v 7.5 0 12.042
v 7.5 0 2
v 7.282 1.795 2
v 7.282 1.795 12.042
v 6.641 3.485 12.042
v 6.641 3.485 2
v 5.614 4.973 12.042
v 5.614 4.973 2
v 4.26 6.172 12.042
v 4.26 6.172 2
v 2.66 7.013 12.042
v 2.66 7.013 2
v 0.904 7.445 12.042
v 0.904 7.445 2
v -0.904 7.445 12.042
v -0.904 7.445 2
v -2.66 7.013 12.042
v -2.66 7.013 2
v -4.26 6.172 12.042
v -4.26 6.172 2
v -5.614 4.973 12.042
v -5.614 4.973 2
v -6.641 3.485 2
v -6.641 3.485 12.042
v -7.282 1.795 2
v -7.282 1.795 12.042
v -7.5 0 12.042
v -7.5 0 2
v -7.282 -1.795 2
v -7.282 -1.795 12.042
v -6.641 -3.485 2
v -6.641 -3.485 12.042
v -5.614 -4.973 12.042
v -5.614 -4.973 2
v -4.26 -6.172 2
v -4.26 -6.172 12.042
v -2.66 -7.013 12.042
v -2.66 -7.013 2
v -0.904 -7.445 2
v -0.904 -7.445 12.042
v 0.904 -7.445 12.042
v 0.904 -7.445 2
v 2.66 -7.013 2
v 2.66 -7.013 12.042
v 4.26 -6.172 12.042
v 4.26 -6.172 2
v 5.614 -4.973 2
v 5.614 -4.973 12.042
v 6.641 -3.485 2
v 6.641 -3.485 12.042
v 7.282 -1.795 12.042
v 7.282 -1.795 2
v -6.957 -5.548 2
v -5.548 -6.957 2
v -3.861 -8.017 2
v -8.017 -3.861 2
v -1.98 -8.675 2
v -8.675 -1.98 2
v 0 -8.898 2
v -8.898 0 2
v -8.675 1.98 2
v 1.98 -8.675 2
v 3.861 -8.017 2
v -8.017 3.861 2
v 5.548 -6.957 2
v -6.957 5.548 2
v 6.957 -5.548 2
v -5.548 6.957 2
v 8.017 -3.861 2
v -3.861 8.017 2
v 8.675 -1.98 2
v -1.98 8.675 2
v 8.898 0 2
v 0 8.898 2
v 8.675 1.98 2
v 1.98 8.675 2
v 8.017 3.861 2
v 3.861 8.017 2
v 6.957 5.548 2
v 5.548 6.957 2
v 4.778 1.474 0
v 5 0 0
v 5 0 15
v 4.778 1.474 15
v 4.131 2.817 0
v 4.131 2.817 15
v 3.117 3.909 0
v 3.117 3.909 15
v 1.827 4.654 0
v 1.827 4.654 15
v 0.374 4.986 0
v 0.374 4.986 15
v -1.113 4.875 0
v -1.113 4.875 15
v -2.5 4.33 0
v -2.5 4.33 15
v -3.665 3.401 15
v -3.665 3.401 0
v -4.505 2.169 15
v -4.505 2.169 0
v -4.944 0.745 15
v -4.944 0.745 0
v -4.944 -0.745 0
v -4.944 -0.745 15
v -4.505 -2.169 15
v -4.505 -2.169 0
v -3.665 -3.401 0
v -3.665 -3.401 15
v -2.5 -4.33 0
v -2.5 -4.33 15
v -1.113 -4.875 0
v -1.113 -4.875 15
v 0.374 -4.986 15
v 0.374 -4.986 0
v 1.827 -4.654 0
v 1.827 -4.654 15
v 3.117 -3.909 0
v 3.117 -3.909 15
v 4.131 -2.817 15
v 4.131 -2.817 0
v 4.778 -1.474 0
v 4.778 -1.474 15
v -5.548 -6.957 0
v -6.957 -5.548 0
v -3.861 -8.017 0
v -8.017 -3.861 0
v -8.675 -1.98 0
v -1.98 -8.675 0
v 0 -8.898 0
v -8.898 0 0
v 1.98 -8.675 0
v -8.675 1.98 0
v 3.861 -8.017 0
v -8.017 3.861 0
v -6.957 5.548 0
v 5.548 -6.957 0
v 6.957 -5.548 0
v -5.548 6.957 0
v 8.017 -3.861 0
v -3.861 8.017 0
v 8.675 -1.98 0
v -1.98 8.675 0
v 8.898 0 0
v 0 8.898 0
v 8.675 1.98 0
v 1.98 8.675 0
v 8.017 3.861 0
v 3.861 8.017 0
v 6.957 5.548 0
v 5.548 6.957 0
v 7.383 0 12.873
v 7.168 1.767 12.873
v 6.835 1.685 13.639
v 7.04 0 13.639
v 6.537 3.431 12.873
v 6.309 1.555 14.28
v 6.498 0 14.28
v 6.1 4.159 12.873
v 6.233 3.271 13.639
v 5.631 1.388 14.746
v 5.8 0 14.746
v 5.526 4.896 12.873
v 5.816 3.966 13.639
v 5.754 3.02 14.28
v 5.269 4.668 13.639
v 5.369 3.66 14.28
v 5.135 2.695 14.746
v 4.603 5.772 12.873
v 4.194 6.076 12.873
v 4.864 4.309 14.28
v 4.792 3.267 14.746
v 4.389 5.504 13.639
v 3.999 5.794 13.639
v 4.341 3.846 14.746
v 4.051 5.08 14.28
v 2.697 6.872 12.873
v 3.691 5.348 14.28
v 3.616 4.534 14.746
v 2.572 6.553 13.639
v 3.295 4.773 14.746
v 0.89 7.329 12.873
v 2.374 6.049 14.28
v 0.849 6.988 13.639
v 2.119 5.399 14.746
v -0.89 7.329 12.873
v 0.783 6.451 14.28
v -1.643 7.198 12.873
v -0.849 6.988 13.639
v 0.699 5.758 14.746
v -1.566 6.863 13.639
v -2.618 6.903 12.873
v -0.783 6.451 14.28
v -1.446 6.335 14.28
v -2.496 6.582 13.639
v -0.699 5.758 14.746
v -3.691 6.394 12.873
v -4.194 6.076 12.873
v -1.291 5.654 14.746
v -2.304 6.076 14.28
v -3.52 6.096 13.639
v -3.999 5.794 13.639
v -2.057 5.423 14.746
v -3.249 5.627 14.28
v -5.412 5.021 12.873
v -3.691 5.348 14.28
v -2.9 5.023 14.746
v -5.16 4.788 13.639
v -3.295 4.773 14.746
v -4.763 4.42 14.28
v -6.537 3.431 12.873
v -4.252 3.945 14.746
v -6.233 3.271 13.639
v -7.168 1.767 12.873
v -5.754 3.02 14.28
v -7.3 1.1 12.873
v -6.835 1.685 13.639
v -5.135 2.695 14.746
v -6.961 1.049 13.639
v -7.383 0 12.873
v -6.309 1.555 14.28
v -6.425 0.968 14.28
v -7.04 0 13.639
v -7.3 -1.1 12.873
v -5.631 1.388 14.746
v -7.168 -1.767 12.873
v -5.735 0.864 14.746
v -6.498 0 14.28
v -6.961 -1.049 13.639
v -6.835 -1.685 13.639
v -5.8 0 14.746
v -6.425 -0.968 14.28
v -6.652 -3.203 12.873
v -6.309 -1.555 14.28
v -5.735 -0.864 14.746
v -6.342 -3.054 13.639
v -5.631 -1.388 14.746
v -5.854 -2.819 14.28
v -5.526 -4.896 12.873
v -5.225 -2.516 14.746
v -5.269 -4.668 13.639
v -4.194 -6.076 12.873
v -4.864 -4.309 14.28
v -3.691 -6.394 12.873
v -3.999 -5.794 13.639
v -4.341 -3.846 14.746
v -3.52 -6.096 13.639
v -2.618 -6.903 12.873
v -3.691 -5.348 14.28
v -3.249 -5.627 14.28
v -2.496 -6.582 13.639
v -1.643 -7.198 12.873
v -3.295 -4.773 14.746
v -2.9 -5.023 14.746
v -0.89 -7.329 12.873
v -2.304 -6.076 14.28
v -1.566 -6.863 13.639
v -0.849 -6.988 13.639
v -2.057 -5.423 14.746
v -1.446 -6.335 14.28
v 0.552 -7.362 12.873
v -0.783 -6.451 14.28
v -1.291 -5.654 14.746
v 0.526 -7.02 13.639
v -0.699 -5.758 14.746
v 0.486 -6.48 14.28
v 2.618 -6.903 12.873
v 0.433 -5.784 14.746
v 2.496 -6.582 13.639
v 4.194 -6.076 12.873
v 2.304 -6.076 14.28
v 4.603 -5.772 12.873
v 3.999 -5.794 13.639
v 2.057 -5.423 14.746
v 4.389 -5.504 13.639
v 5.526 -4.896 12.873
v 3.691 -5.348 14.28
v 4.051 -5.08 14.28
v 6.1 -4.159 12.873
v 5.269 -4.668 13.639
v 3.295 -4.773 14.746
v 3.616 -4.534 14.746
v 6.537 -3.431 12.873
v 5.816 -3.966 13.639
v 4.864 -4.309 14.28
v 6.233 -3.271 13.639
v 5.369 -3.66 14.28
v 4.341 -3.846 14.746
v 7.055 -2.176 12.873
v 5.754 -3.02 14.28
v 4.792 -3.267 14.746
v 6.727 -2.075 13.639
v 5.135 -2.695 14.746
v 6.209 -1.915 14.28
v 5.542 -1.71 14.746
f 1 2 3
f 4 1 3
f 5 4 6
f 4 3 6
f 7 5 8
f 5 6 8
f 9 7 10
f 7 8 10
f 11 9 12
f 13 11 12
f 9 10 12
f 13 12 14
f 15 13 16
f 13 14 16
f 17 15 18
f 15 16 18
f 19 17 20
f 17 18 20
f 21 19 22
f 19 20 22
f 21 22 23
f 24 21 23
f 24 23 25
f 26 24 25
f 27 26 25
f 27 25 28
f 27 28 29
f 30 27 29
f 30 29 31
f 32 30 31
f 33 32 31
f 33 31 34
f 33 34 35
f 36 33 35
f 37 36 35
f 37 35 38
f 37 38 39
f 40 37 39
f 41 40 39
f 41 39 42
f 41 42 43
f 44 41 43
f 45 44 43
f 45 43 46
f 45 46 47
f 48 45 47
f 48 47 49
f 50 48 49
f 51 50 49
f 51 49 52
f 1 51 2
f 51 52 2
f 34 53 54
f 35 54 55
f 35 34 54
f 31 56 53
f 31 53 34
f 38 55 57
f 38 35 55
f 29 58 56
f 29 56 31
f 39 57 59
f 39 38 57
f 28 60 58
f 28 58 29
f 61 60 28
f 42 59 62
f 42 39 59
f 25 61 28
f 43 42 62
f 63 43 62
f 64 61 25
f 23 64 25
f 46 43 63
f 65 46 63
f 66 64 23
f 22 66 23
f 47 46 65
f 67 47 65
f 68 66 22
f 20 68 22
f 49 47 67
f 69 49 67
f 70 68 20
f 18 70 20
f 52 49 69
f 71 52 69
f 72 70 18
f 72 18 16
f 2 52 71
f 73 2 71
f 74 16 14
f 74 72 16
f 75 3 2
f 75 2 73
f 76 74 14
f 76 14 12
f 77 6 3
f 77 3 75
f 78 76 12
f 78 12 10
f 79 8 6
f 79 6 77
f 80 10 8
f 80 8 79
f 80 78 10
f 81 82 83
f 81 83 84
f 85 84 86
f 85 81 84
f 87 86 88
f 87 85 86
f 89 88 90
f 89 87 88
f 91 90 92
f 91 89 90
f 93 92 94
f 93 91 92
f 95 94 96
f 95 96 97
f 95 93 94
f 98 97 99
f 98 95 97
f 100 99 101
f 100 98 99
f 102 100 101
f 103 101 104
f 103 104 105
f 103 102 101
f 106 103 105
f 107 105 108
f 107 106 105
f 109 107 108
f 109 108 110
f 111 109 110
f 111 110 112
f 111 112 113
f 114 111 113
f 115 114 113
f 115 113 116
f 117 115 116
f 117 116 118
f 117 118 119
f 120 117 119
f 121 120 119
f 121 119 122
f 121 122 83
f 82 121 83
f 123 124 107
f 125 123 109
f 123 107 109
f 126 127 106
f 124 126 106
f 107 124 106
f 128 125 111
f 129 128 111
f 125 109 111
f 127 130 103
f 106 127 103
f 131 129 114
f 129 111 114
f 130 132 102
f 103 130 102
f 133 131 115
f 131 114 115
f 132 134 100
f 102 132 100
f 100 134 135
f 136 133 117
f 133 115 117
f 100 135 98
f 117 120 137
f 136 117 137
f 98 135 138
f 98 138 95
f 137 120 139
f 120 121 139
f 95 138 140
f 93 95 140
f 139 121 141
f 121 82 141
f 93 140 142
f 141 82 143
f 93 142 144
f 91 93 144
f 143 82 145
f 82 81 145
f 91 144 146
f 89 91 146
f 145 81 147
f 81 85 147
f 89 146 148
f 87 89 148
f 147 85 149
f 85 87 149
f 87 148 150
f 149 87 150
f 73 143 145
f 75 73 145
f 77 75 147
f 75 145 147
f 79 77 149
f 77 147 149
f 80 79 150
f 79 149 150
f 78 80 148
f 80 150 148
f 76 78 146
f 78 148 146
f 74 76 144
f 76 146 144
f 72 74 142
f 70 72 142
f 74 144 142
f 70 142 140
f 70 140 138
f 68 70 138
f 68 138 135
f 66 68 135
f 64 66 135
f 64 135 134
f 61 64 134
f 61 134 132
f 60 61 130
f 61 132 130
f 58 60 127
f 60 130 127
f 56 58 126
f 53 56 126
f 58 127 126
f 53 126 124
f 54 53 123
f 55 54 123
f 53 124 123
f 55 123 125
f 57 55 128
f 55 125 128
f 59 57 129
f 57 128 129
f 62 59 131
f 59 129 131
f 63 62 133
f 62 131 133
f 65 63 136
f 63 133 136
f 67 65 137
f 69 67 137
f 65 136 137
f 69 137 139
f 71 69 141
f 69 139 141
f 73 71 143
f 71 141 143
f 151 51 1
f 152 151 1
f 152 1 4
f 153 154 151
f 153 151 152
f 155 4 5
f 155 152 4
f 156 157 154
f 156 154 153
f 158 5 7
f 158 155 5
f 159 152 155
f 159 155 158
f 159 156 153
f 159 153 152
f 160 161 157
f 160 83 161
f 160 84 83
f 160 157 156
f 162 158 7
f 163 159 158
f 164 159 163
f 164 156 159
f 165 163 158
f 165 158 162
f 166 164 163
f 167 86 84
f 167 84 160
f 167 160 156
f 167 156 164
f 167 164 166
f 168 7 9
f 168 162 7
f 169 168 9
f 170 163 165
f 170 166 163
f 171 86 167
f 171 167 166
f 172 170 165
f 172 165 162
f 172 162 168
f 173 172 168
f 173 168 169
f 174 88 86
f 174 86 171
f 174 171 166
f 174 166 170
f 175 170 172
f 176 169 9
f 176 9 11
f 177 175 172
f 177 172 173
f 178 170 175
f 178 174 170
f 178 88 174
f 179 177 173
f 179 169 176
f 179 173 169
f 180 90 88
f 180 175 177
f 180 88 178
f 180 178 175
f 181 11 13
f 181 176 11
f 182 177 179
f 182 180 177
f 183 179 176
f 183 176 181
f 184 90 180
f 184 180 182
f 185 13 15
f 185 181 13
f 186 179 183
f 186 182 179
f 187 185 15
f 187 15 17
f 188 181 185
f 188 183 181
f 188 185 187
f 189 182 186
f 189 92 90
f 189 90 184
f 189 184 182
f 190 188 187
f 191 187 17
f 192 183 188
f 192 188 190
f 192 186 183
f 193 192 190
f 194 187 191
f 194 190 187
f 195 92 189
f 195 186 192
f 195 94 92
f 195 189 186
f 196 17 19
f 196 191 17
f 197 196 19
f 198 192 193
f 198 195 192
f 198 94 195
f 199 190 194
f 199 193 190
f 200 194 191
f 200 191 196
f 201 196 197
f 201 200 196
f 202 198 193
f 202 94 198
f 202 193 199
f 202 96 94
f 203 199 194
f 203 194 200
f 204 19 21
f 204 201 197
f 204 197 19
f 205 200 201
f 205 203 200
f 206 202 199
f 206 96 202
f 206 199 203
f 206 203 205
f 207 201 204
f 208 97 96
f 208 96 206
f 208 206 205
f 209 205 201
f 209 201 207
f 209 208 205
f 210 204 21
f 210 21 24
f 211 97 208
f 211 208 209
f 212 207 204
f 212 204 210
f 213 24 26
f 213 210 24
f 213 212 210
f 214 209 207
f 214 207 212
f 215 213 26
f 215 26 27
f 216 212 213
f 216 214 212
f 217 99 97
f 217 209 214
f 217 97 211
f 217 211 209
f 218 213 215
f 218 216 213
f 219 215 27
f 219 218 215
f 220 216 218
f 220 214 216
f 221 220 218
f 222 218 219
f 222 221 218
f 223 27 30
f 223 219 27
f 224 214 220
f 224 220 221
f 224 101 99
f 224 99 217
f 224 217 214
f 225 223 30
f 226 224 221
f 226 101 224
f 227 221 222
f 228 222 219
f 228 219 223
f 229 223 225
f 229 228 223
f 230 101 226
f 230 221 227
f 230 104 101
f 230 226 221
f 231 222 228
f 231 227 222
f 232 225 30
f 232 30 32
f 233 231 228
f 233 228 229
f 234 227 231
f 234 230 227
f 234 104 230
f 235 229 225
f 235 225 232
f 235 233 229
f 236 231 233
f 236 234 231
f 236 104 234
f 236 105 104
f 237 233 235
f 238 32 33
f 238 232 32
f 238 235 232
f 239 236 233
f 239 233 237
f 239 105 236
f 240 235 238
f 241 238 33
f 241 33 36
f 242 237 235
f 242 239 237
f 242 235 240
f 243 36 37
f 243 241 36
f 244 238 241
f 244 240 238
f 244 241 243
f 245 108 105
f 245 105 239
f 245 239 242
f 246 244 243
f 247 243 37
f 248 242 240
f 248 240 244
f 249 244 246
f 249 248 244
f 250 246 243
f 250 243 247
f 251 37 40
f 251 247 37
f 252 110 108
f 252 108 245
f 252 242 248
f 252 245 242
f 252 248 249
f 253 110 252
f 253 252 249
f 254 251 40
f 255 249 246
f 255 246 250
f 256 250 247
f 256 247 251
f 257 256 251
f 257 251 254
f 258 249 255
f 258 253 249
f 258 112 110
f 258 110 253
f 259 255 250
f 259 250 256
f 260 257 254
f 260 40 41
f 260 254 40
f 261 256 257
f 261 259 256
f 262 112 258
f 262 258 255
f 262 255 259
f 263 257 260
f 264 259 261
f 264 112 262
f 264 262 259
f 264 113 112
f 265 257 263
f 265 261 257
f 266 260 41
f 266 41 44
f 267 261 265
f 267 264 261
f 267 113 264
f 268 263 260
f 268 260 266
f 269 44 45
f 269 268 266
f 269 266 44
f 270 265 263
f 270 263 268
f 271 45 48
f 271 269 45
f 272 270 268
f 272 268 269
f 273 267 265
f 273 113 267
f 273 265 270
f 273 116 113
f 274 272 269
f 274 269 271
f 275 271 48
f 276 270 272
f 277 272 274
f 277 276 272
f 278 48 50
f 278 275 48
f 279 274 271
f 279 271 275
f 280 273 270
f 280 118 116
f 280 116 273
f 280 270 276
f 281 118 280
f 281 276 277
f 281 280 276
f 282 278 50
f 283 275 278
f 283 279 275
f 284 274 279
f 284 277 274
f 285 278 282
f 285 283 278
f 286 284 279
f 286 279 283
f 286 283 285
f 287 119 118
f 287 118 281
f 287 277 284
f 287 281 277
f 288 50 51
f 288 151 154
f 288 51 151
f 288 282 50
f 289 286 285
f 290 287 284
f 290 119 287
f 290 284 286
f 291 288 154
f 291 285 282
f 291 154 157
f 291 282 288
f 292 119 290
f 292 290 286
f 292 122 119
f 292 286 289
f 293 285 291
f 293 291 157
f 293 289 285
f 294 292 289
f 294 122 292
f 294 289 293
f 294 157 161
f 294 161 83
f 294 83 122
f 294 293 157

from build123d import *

# Parameters (mm, degrees)
F0_R     = 7.5
F1_DEPTH = 15
F2_R     = 8.8984666771
F2_R_2   = 7.5
F3_DEPTH = 2
F4_T     = 2.5


# Not quite as in the source:
# - a fillet or chamfer that OpenCascade refuses, or shapes differently, is made with other operations: its cross-section is extruded or revolved along the edge and cut away or added
# - a shell that OpenCascade refuses in one call is made with other operations: the cavity is built on its own and cut out


with BuildPart() as f1:
    # F0 (on Top) → F1 (new body)
    with BuildSketch(Plane.XY):
        Circle(F0_R)
    extrude(amount=F1_DEPTH)

    # F2 (on face) → F3 (join)
    with BuildSketch(Plane.XY):
        Circle(F2_R)
        Circle(F2_R_2, mode=Mode.SUBTRACT)
    extrude(amount=F3_DEPTH)

    # F4: shell of thickness 2.5, made by hand


with BuildPart() as f4_core1:
    # F4_t2: copy of F1
    add(f1.part)

    # the walls: a layer under each face that stays
    f4_faces = [f4_core1.faces().sort_by_distance(p)[0] for p in [
        (-7.5, 0, 8.5),
        (-5.9323111181, -5.9323111181, 2),
        (-8.8984666771, 0, 1),
    ]]
    thicken(f4_faces, amount=-F4_T, mode=Mode.SUBTRACT)

    # F4_s3 → F4_t4 (revolve, cut)
    with BuildSketch(Plane.XZ):
        Polygon((7.525, 2.025), (5, 2), (5, -0.5), (7.5, -0.5), align=None)
    revolve(axis=Axis((0, 0, 2), (0, 0, 1)), mode=Mode.SUBTRACT)


with BuildPart() as f1_1:
    add(f1.part)

    # what is left inside the walls is the cavity
    f4_cavity = [f4_core1.part.solids().sort_by_distance(p)[0] for p in [
        (-4.975, 0, 10),
    ]]
    add(f4_cavity, mode=Mode.SUBTRACT)

    # F5: fillet of radius 3 on 1 edges, made by hand

    # F5_s1 → F5_t2 (revolve, cut)
    with BuildSketch(Plane.XZ):
        with BuildLine():
            ThreePointArc((7.5, 12.0419601084), (6.7912878475, 13.9784517816), (5, 15))
            Line((5, 15), (7.5, 15))
            Line((7.5, 15), (7.5, 12.0419601084))
        make_face()
    revolve(axis=Axis((0, 0, 15), (0, 0, 1)), mode=Mode.SUBTRACT)


solid = f1_1.part
